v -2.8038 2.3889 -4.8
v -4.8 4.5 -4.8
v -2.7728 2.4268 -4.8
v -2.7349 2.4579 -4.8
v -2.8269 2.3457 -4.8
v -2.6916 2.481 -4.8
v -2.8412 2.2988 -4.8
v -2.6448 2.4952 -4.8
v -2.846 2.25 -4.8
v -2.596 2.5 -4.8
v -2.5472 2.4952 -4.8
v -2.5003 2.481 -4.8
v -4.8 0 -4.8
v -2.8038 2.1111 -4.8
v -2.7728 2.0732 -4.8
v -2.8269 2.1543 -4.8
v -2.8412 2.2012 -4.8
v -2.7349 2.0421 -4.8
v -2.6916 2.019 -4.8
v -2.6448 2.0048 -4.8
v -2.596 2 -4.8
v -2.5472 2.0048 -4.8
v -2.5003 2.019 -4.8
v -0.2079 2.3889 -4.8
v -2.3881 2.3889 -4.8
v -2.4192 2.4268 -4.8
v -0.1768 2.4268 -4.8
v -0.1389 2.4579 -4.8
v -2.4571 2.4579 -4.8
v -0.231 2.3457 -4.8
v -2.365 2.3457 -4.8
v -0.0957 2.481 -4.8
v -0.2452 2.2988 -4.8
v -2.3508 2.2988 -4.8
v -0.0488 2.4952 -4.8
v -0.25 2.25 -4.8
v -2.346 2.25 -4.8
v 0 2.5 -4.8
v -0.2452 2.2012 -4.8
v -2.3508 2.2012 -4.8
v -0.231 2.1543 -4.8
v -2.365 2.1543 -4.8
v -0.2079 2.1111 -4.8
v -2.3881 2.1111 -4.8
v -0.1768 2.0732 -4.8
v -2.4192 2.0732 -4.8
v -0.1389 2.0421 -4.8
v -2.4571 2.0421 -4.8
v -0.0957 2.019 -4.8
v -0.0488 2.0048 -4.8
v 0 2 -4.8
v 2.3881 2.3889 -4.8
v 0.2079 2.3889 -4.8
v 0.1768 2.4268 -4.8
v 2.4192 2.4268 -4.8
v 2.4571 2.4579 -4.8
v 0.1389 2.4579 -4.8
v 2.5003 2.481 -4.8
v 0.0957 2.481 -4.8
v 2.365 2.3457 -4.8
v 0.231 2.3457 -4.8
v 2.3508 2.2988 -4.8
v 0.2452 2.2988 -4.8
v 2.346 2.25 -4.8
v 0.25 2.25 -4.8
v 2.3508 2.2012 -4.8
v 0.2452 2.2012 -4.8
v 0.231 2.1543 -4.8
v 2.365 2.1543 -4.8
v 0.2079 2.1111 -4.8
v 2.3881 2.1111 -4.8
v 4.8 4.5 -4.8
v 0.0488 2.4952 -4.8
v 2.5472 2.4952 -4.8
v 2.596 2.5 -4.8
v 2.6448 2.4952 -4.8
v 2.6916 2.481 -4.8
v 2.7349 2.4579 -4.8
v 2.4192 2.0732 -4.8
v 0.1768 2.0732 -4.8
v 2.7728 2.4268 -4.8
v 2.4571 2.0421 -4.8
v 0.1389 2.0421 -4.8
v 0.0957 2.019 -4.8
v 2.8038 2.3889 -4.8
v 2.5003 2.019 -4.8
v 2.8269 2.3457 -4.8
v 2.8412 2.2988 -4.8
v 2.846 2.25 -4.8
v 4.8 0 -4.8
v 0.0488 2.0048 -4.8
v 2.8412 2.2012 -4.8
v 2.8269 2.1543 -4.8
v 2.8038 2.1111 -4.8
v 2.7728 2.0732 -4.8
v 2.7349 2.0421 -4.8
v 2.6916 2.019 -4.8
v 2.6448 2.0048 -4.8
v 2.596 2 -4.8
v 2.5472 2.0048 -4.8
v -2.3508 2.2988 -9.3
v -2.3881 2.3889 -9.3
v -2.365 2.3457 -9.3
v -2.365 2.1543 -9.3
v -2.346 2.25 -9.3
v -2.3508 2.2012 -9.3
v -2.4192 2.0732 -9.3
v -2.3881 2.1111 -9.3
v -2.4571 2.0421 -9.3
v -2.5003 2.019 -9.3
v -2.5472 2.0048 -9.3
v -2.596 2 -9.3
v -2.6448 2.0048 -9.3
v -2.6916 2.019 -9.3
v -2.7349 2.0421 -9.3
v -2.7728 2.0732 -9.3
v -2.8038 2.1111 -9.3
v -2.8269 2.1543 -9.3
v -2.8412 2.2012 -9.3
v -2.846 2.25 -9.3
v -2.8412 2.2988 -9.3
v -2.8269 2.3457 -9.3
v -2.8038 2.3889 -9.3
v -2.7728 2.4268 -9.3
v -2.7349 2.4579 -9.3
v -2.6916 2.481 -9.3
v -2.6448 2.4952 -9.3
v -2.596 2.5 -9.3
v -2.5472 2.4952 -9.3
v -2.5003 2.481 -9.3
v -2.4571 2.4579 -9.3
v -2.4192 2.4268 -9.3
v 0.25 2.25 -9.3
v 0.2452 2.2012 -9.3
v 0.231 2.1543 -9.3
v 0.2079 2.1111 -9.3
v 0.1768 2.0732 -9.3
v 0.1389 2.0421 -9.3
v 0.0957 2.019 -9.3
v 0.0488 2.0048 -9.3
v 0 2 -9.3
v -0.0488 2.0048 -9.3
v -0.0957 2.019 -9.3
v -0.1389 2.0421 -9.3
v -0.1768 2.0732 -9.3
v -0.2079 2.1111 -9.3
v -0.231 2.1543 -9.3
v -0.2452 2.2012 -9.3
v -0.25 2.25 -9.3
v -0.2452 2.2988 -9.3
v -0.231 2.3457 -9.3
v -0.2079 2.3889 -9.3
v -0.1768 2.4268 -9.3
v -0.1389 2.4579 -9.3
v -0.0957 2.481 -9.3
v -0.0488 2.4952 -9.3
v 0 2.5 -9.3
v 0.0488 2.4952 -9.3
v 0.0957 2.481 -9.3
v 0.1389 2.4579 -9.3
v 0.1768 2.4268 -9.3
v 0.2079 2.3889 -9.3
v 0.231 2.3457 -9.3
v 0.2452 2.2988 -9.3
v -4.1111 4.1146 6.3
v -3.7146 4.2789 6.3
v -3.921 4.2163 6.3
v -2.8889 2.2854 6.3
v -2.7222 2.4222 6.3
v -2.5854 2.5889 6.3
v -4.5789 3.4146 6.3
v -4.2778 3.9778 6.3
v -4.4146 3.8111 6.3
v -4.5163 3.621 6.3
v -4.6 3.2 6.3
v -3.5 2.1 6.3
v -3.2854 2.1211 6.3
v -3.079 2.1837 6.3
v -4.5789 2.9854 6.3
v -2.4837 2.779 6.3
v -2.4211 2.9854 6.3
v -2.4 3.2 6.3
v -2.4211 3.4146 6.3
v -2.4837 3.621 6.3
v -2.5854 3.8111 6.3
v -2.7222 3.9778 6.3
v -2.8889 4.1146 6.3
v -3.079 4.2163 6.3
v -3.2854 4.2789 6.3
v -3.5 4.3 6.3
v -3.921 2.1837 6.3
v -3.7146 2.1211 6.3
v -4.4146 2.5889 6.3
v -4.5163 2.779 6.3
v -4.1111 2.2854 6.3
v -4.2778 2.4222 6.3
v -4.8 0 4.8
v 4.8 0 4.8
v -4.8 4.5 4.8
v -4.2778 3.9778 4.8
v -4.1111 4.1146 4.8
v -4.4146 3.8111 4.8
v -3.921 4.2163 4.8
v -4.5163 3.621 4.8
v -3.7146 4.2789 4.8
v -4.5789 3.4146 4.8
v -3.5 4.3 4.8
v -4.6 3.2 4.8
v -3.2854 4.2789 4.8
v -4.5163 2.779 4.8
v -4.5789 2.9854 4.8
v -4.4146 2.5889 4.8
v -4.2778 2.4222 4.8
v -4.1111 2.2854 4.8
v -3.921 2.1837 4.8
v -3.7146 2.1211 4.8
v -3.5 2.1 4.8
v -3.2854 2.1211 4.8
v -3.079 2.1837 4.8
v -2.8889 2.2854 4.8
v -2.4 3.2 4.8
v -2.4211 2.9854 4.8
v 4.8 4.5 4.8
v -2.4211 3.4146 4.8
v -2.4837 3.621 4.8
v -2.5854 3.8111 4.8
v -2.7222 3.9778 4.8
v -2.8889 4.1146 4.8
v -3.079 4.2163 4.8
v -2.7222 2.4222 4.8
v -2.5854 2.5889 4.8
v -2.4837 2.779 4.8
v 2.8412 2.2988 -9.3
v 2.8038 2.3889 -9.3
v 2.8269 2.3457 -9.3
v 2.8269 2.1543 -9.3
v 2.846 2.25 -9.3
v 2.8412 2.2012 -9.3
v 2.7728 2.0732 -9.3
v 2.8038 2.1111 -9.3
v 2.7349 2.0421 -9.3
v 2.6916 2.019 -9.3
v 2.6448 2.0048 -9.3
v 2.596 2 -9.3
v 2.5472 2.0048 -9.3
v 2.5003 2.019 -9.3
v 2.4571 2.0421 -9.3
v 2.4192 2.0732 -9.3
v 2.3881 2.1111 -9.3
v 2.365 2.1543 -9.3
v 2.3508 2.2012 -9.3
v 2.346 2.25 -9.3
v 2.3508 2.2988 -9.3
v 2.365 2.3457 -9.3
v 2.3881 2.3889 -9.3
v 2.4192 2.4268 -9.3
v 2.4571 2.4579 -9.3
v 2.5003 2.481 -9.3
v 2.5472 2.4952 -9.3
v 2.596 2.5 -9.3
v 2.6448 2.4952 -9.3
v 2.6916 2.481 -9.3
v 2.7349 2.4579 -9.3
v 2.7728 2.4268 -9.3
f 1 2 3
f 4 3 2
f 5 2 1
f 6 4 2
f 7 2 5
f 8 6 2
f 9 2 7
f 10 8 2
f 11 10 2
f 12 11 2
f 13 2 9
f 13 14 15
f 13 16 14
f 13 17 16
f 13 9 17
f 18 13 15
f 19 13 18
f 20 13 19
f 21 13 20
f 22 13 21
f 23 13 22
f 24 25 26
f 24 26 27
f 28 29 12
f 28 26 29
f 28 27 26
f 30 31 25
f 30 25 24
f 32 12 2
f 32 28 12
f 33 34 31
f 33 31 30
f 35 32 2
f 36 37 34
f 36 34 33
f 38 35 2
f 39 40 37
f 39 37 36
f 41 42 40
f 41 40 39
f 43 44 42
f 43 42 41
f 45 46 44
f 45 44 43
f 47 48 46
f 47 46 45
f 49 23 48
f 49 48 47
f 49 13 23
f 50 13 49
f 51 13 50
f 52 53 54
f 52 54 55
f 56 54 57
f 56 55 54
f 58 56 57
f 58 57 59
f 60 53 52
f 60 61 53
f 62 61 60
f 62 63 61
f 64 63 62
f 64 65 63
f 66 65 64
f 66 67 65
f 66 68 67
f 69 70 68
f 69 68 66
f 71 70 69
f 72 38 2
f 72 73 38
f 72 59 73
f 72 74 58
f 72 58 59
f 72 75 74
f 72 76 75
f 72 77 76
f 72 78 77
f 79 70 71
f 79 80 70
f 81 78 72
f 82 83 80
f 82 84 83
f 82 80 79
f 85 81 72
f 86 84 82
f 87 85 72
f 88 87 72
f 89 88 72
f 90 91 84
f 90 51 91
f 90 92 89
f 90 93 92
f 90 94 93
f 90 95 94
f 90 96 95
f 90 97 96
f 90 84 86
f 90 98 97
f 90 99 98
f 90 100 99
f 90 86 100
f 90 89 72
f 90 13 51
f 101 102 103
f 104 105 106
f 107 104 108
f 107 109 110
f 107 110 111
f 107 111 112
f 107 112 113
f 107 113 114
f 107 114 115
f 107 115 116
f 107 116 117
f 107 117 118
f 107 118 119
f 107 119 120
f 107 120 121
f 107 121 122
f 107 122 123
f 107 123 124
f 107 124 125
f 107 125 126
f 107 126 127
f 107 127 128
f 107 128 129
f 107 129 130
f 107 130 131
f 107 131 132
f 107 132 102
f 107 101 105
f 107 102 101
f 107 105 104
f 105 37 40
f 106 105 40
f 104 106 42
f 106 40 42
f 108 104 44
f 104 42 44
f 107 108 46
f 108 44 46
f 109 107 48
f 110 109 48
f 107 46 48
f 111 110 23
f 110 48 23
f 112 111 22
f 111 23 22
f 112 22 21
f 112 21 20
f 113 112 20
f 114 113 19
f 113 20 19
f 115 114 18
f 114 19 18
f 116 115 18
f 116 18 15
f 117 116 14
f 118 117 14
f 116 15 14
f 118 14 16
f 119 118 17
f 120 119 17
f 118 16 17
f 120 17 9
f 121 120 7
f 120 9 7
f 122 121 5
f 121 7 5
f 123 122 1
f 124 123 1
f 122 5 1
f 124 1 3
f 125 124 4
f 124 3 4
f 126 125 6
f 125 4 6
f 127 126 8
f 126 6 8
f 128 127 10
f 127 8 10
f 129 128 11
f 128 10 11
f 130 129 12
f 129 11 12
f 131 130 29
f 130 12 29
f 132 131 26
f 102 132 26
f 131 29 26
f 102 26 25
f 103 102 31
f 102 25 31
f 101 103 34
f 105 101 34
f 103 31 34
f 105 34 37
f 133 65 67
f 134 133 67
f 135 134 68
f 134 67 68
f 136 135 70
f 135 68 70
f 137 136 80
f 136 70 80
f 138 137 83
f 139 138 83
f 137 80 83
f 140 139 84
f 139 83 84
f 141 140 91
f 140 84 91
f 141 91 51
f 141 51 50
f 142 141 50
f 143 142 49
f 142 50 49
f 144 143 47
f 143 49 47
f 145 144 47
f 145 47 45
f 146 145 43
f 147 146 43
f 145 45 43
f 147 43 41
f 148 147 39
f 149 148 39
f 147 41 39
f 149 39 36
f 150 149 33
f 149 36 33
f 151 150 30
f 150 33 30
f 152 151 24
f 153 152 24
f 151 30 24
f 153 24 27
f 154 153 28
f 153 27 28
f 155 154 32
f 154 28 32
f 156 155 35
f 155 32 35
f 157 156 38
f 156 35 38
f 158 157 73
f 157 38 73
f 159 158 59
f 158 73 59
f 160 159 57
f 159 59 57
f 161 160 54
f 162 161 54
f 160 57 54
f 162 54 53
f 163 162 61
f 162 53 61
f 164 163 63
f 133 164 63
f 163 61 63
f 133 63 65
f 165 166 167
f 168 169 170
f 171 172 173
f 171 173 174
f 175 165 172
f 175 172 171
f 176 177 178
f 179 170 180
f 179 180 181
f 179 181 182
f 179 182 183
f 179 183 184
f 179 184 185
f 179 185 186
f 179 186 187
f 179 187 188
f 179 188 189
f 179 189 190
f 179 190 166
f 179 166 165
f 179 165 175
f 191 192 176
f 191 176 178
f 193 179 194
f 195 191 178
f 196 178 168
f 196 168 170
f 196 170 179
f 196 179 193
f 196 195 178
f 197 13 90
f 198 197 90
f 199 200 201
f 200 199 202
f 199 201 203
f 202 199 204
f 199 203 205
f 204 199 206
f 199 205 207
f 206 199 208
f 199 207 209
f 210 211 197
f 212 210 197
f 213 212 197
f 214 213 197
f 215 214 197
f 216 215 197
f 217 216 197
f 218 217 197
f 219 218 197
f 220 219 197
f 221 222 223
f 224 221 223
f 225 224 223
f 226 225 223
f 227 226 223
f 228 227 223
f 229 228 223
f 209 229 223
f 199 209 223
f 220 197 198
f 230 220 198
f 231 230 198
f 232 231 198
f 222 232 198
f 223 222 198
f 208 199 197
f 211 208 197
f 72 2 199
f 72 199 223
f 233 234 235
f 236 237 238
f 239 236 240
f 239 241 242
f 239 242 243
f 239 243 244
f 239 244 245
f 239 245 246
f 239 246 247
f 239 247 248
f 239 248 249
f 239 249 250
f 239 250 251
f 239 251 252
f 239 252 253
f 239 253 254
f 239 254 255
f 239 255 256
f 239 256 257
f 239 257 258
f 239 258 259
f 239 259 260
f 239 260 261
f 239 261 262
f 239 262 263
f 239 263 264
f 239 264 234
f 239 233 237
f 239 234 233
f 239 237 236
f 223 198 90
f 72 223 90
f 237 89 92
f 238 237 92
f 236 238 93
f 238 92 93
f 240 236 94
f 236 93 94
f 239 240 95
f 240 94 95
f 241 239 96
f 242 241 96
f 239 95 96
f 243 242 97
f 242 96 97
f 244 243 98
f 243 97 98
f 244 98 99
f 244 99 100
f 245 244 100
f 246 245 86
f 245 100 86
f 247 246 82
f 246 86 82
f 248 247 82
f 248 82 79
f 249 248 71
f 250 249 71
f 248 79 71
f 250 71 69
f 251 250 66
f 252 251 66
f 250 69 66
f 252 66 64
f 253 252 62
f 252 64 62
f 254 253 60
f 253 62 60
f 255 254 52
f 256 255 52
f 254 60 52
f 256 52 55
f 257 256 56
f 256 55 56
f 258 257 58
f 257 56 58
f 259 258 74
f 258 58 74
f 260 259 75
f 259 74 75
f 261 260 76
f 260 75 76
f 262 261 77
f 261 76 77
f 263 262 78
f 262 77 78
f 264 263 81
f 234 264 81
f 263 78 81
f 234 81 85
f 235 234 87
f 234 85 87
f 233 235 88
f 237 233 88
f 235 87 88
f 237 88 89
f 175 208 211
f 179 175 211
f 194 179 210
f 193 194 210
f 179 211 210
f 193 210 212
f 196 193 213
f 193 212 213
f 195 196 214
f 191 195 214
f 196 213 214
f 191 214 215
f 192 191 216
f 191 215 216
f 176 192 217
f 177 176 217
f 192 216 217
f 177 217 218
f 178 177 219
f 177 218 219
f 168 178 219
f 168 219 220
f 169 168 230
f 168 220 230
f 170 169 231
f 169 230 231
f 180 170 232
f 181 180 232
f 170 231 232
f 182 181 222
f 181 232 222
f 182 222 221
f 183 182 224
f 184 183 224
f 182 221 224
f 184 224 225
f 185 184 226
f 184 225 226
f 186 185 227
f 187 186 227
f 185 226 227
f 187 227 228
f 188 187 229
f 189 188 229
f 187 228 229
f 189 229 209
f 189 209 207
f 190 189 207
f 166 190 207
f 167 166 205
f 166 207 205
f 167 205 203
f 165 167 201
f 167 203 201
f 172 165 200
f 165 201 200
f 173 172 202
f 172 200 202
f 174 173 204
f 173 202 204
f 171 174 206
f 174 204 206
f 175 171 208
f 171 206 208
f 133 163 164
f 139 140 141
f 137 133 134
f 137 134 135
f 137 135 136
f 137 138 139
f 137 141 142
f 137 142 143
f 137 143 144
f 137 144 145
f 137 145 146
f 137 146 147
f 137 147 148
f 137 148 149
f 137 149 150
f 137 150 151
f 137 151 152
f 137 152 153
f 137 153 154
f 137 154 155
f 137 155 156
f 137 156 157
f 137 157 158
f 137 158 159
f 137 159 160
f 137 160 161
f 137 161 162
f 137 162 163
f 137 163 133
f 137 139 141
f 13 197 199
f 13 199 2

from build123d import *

# Parameters (mm, degrees)
SKETCH_1_W        = 9.6
SKETCH_1_H        = 9.6
EXTRUDE_1_DEPTH   = 4.5
SKETCH_3_R        = 0.25
EXTRUDE_3_DEPTH   = 4.5
SKETCH_4_R        = 1.1
EXTRUDE_1_2_DEPTH = 1.5


with BuildPart() as part:
    # 草图1 → Extrude 1 (new body)
    with BuildSketch(Plane(origin=(0, 0, 0), x_dir=(1, 0, 0), z_dir=(0, 1, 0))):
        Rectangle(SKETCH_1_W, SKETCH_1_H)
    extrude(amount=EXTRUDE_1_DEPTH)

    # 草图3 → 拉伸3 (add)
    with BuildSketch(Plane(origin=(0, 0, -4.8), x_dir=(-1, 0, 0), z_dir=(0, 0, -1))):
        with Locations(Location((0, 2.25, 0), (0, 0, 180))):
            Circle(SKETCH_3_R)
        with Locations(Location((2.595978382, 2.25, 0), (0, 0, 180))):
            Circle(SKETCH_3_R)
        with Locations(Location((-2.595978382, 2.25, 0), (0, 0, 180))):
            Circle(SKETCH_3_R)
    extrude(amount=EXTRUDE_3_DEPTH)

    # 草图4 → Extrude 1 2 (add)
    with BuildSketch(Plane.XY.offset(4.8)):
        with Locations(Location((-3.5, 3.2, 0), (0, 0, 180))):
            Circle(SKETCH_4_R)
    extrude(amount=EXTRUDE_1_2_DEPTH)


solid = part.part
